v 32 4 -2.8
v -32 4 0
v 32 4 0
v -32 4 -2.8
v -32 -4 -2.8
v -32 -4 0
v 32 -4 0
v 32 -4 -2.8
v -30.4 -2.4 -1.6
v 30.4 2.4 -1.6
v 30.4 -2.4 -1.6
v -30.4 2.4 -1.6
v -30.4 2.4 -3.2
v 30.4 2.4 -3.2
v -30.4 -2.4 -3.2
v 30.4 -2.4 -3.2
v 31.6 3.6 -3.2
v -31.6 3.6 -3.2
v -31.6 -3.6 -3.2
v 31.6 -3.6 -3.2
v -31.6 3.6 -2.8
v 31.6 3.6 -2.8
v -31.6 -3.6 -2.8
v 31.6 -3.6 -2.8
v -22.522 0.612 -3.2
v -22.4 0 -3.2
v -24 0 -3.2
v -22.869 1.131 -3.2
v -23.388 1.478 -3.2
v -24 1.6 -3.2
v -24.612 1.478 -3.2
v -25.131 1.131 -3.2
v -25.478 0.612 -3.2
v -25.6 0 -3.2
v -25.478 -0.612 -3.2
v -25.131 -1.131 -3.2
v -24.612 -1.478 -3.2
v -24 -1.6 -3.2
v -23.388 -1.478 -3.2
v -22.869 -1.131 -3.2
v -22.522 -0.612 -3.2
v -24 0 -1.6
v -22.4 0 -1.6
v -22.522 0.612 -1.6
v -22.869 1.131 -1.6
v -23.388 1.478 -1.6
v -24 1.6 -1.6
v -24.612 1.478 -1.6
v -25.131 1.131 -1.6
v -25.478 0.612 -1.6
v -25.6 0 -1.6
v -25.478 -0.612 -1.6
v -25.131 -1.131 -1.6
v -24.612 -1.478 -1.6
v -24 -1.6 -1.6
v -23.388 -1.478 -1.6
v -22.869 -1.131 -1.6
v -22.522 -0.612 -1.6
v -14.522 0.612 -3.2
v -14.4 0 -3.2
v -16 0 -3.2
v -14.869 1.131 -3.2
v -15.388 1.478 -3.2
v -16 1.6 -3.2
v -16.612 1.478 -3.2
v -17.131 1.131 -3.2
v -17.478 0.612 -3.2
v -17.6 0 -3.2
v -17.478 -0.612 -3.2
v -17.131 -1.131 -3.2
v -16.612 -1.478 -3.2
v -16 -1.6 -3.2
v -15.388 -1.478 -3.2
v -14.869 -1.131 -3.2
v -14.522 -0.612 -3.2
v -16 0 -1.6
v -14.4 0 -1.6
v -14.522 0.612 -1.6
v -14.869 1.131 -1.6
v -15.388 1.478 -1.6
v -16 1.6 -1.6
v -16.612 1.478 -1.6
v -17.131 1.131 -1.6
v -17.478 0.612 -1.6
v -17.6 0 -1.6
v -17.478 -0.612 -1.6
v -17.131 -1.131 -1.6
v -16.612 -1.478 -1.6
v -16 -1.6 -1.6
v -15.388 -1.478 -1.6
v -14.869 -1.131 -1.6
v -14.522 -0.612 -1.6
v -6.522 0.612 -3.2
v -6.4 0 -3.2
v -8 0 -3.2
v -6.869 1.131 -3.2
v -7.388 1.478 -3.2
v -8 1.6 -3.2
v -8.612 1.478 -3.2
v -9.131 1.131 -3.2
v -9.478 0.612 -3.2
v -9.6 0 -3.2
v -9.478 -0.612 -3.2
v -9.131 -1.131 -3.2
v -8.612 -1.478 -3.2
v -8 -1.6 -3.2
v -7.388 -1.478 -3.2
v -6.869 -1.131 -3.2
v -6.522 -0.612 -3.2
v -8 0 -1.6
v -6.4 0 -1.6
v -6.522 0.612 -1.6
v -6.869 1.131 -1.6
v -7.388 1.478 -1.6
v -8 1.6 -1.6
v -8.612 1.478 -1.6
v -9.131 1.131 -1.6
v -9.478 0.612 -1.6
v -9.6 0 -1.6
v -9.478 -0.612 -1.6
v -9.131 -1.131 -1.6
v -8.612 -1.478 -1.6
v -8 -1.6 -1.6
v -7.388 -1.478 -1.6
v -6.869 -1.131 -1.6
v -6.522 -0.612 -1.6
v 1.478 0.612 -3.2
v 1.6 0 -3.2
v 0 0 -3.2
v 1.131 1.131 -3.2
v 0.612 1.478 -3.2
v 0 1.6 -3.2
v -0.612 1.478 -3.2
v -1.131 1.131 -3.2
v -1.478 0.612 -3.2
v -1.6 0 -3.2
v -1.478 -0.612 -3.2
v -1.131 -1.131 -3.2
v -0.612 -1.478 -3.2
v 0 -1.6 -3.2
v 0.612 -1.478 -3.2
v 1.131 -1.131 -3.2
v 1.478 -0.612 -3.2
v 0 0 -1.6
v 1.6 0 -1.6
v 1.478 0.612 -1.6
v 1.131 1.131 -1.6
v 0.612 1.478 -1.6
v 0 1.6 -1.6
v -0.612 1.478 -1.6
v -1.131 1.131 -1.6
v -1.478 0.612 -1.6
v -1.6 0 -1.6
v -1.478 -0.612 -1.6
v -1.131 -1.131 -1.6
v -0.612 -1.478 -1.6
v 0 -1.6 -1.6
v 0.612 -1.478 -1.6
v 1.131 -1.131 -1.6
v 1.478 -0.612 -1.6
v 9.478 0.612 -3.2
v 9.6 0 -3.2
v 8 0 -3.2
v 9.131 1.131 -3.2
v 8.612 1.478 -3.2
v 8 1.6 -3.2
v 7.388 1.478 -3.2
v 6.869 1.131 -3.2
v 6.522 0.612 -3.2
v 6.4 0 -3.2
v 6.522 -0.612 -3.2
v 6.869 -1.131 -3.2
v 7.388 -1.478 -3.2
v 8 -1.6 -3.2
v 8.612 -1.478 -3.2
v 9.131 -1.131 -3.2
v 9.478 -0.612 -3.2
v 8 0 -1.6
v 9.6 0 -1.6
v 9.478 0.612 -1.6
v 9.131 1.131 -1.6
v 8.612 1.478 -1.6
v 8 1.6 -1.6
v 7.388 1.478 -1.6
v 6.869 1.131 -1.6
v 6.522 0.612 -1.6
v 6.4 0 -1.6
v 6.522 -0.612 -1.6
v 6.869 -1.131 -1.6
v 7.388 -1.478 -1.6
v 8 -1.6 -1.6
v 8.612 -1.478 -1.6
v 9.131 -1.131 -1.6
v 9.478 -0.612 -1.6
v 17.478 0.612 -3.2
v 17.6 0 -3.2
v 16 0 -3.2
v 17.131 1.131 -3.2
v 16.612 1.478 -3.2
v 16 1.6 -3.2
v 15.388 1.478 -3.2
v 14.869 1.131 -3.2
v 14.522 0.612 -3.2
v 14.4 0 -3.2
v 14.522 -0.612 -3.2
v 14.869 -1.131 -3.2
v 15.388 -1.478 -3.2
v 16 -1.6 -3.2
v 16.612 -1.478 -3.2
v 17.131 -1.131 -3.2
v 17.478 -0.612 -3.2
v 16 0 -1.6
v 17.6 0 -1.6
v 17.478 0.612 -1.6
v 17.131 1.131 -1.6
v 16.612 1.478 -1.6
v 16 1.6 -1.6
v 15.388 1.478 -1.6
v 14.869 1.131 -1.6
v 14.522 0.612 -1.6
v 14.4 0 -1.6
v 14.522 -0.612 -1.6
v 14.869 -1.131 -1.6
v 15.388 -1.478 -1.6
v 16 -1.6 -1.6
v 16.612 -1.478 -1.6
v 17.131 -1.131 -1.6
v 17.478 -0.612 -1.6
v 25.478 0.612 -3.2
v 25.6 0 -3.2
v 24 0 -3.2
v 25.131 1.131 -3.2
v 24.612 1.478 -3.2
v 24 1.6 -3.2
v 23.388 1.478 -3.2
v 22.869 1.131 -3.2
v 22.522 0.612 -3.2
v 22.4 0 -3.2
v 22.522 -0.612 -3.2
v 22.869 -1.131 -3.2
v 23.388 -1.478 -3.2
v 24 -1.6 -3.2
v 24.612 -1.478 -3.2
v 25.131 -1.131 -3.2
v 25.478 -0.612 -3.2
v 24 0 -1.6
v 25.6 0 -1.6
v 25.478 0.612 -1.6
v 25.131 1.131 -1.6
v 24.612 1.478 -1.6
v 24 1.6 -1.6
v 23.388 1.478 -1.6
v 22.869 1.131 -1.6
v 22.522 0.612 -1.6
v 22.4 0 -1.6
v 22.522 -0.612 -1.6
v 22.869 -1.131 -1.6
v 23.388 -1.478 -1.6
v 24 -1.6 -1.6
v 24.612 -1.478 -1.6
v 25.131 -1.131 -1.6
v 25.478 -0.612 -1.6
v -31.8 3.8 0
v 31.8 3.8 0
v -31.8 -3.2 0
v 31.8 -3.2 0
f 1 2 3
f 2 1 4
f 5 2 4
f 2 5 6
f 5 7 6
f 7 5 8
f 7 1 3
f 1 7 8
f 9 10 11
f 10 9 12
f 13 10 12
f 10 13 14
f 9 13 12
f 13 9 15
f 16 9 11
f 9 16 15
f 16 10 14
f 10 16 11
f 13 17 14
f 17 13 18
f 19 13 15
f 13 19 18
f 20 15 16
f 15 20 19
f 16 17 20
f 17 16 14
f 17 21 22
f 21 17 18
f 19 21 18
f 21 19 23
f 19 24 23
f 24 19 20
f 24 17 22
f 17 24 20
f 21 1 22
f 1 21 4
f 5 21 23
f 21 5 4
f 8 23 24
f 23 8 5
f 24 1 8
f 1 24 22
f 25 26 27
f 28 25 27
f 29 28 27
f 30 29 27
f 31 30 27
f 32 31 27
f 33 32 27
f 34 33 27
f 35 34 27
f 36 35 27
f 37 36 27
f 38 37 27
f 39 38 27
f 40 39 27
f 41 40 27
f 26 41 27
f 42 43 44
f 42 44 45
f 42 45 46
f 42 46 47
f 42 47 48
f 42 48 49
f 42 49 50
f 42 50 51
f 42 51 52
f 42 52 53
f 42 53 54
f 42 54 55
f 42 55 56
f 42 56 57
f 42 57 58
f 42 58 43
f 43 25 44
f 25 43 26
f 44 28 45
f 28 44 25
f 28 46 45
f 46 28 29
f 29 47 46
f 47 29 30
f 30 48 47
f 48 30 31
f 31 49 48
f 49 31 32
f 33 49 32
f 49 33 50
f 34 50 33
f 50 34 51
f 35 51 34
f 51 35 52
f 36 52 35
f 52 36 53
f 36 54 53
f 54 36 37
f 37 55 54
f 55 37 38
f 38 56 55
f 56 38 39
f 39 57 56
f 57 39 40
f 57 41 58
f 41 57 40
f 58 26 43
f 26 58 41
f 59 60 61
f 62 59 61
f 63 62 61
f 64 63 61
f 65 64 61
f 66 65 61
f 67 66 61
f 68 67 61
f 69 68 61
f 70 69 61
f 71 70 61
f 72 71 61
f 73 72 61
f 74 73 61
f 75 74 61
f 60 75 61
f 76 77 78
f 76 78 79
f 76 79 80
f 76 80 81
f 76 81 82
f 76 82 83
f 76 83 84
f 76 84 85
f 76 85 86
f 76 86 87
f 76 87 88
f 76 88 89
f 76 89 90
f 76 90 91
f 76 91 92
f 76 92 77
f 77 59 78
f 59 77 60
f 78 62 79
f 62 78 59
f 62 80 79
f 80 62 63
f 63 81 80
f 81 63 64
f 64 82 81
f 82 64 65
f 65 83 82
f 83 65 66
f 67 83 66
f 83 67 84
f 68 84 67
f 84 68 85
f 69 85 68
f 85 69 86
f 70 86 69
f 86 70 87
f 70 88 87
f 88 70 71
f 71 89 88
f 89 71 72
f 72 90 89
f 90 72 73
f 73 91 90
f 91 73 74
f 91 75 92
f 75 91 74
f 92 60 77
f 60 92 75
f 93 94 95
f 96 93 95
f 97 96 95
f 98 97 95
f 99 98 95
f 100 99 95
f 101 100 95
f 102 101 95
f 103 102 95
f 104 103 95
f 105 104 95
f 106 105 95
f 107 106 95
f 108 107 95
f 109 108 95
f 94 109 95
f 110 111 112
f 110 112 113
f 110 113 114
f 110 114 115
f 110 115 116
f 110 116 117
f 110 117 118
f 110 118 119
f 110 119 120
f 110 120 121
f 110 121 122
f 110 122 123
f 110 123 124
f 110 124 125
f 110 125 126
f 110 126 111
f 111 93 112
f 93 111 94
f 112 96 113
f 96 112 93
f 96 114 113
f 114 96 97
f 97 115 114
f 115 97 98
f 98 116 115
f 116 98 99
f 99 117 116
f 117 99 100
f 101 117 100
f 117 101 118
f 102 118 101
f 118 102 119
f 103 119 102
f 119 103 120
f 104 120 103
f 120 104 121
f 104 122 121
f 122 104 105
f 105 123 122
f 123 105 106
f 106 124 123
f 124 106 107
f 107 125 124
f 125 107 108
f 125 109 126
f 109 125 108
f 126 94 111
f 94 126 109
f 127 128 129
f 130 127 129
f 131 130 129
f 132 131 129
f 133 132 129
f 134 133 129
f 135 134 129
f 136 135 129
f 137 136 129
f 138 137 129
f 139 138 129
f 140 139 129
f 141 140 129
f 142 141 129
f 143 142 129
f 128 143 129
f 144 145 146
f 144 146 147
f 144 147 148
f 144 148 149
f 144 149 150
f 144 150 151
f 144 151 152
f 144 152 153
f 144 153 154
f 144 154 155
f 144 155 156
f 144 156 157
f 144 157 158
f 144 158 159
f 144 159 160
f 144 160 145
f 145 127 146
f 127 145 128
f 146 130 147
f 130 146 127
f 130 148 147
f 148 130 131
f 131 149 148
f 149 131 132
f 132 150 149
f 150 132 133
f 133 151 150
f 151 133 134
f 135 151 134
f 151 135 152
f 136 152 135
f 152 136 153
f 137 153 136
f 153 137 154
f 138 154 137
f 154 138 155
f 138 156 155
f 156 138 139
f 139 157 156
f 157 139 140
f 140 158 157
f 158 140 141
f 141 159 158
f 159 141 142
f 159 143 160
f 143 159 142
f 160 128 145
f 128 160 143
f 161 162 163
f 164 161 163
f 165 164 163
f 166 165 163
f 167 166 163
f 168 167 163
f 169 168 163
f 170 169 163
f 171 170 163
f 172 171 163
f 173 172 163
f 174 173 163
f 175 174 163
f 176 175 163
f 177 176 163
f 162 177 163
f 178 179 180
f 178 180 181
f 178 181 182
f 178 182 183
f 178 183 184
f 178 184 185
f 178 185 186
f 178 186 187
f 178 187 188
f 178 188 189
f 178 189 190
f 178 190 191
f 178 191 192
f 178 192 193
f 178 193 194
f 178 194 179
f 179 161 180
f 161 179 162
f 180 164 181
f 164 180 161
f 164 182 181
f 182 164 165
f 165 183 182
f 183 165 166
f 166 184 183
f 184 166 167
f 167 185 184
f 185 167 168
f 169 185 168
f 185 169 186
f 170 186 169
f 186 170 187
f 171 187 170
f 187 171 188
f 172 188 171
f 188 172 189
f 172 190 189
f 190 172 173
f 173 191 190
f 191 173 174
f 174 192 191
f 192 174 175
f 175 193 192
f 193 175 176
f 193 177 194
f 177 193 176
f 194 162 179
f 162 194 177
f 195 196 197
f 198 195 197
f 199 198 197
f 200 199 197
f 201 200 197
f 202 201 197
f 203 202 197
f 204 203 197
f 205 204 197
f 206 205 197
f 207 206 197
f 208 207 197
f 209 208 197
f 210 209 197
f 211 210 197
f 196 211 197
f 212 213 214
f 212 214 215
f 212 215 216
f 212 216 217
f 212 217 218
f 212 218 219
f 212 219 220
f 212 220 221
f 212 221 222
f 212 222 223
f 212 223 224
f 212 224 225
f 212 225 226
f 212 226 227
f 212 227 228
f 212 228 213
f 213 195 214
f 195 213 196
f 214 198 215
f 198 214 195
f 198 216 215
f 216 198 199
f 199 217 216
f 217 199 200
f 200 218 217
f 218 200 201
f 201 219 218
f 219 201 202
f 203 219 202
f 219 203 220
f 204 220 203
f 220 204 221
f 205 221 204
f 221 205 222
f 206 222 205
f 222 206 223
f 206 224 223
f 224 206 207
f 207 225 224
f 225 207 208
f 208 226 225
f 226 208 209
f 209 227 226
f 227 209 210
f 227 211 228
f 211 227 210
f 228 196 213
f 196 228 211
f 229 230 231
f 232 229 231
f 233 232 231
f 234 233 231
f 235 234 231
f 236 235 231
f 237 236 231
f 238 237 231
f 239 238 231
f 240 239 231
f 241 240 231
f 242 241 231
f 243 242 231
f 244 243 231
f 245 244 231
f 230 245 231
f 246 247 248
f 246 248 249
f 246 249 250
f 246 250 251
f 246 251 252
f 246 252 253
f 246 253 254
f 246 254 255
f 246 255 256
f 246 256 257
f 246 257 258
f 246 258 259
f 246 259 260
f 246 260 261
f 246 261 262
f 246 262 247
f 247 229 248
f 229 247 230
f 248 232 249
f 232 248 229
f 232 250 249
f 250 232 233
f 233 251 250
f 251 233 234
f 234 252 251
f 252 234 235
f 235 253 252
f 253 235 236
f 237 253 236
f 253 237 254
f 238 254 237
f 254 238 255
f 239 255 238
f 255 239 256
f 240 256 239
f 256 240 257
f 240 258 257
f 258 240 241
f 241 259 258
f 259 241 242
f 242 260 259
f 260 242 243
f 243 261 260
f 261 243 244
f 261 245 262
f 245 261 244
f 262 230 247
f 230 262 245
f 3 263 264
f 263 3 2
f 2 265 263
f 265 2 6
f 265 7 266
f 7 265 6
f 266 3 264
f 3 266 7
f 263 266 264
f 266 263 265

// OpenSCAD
// file: ../p/4-4edge.scad
use <../lib.scad>
function ldraw_lib__4_4edge() = [
// 0 Circle 1.0
// 0 Name: 4-4edge.dat
// 0 Author: James Jessiman
// 0 !LDRAW_ORG Primitive UPDATE 2017-01
// 0 !LICENSE Licensed under CC BY 2.0 and CC BY 4.0 : see CAreadme.txt
// 
// 0 BFC CERTIFY CCW
  [0,"BFC","CERTIFY"],
  [0,"BFC","CCW"],
// 
// 0 !HISTORY 1998-12-15 [PTadmin] Official Update 1998-10
// 0 !HISTORY 2005-12-28 [PTadmin] Official Update 2005-01
// 0 !HISTORY 2007-06-24 [PTadmin] Header formatted for Contributor Agreement
// 0 !HISTORY 2008-07-01 [PTadmin] Official Update 2008-01
// 0 !HISTORY 2017-01-15 [Steffen] BFCed
// 0 !HISTORY 2017-12-30 [PTadmin] Official Update 2017-01
// 
// 
// 2 24 1 0 0 0.9239 0 0.3827
  [2,24,1,0,0,0.9239,0,0.3827],
// 2 24 0.9239 0 0.3827 0.7071 0 0.7071
  [2,24,0.9239,0,0.3827,0.7071,0,0.7071],
// 2 24 0.7071 0 0.7071 0.3827 0 0.9239
  [2,24,0.7071,0,0.7071,0.3827,0,0.9239],
// 2 24 0.3827 0 0.9239 0 0 1
  [2,24,0.3827,0,0.9239,0,0,1],
// 2 24 0 0 1 -0.3827 0 0.9239
  [2,24,0,0,1,-0.3827,0,0.9239],
// 2 24 -0.3827 0 0.9239 -0.7071 0 0.7071
  [2,24,-0.3827,0,0.9239,-0.7071,0,0.7071],
// 2 24 -0.7071 0 0.7071 -0.9239 0 0.3827
  [2,24,-0.7071,0,0.7071,-0.9239,0,0.3827],
// 2 24 -0.9239 0 0.3827 -1 0 -0
  [2,24,-0.9239,0,0.3827,-1,0,-0],
// 2 24 -1 0 -0 -0.9239 0 -0.3827
  [2,24,-1,0,-0,-0.9239,0,-0.3827],
// 2 24 -0.9239 0 -0.3827 -0.7071 0 -0.7071
  [2,24,-0.9239,0,-0.3827,-0.7071,0,-0.7071],
// 2 24 -0.7071 0 -0.7071 -0.3827 0 -0.9239
  [2,24,-0.7071,0,-0.7071,-0.3827,0,-0.9239],
// 2 24 -0.3827 0 -0.9239 0 0 -1
  [2,24,-0.3827,0,-0.9239,0,0,-1],
// 2 24 0 0 -1 0.3827 0 -0.9239
  [2,24,0,0,-1,0.3827,0,-0.9239],
// 2 24 0.3827 0 -0.9239 0.7071 0 -0.7071
  [2,24,0.3827,0,-0.9239,0.7071,0,-0.7071],
// 2 24 0.7071 0 -0.7071 0.9239 0 -0.3827
  [2,24,0.7071,0,-0.7071,0.9239,0,-0.3827],
// 2 24 0.9239 0 -0.3827 1 0 0
  [2,24,0.9239,0,-0.3827,1,0,0],
];
module ldraw_lib__4_4edge(step=0, col=false, unit=2/5, alt=false, line=0.2, solid=!$preview)
    makepoly(ldraw_lib__4_4edge(), step=step, col=col, unit=unit, alt=alt, line=line, solid=solid);
ldraw_lib__4_4edge(line=0.2);
// file: ../p/4-4disc.scad
use <../lib.scad>
function ldraw_lib__4_4disc() = [
// 0 Disc 1.0
// 0 Name: 4-4disc.dat
// 0 Author: James Jessiman
// 0 !LDRAW_ORG Primitive UPDATE 2002-02
// 0 !LICENSE Licensed under CC BY 2.0 and CC BY 4.0 : see CAreadme.txt
// 
// 0 BFC CERTIFY CCW
  [0,"BFC","CERTIFY"],
  [0,"BFC","CCW"],
// 
// 0 !HISTORY 1998-12-15 [PTadmin] Official Update 1998-10
// 0 !HISTORY 2002-03-23 [sbliss] Added BFC statement
// 0 !HISTORY 2002-04-25 [PTadmin] Official Update 2002-02
// 0 !HISTORY 2007-06-24 [PTadmin] Header formatted for Contributor Agreement
// 0 !HISTORY 2008-07-01 [PTadmin] Official Update 2008-01
// 
// 
// 3 16 0 0 0 1 0 0 0.9239 0 0.3827
  [3,16,0,0,0,1,0,0,0.9239,0,0.3827],
// 3 16 0 0 0 0.9239 0 0.3827 0.7071 0 0.7071
  [3,16,0,0,0,0.9239,0,0.3827,0.7071,0,0.7071],
// 3 16 0 0 0 0.7071 0 0.7071 0.3827 0 0.9239
  [3,16,0,0,0,0.7071,0,0.7071,0.3827,0,0.9239],
// 3 16 0 0 0 0.3827 0 0.9239 0 0 1
  [3,16,0,0,0,0.3827,0,0.9239,0,0,1],
// 3 16 0 0 0 0 0 1 -0.3827 0 0.9239
  [3,16,0,0,0,0,0,1,-0.3827,0,0.9239],
// 3 16 0 0 0 -0.3827 0 0.9239 -0.7071 0 0.7071
  [3,16,0,0,0,-0.3827,0,0.9239,-0.7071,0,0.7071],
// 3 16 0 0 0 -0.7071 0 0.7071 -0.9239 0 0.3827
  [3,16,0,0,0,-0.7071,0,0.7071,-0.9239,0,0.3827],
// 3 16 0 0 0 -0.9239 0 0.3827 -1 0 -0
  [3,16,0,0,0,-0.9239,0,0.3827,-1,0,-0],
// 3 16 0 0 0 -1 0 -0 -0.9239 0 -0.3827
  [3,16,0,0,0,-1,0,-0,-0.9239,0,-0.3827],
// 3 16 0 0 0 -0.9239 0 -0.3827 -0.7071 0 -0.7071
  [3,16,0,0,0,-0.9239,0,-0.3827,-0.7071,0,-0.7071],
// 3 16 0 0 0 -0.7071 0 -0.7071 -0.3827 0 -0.9239
  [3,16,0,0,0,-0.7071,0,-0.7071,-0.3827,0,-0.9239],
// 3 16 0 0 0 -0.3827 0 -0.9239 0 0 -1
  [3,16,0,0,0,-0.3827,0,-0.9239,0,0,-1],
// 3 16 0 0 0 0 0 -1 0.3827 0 -0.9239
  [3,16,0,0,0,0,0,-1,0.3827,0,-0.9239],
// 3 16 0 0 0 0.3827 0 -0.9239 0.7071 0 -0.7071
  [3,16,0,0,0,0.3827,0,-0.9239,0.7071,0,-0.7071],
// 3 16 0 0 0 0.7071 0 -0.7071 0.9239 0 -0.3827
  [3,16,0,0,0,0.7071,0,-0.7071,0.9239,0,-0.3827],
// 3 16 0 0 0 0.9239 0 -0.3827 1 0 0
  [3,16,0,0,0,0.9239,0,-0.3827,1,0,0],
// 0
];
module ldraw_lib__4_4disc(step=0, col=false, unit=2/5, alt=false, line=0.2, solid=!$preview)
    makepoly(ldraw_lib__4_4disc(), step=step, col=col, unit=unit, alt=alt, line=line, solid=solid);
ldraw_lib__4_4disc(line=0.2);
// file: ../p/4-4cyli.scad
use <../lib.scad>
$fa=1; $fs=0.2;
function ldraw_lib__4_4cyli(realsolid=false) = [
// 0 Cylinder 1.0
// 0 Name: 4-4cyli.dat
// 0 Author: James Jessiman
// 0 !LDRAW_ORG Primitive UPDATE 2005-01
// 0 !LICENSE Licensed under CC BY 2.0 and CC BY 4.0 : see CAreadme.txt
// 
// 0 BFC CERTIFY CCW
  [0,"BFC","CERTIFY"],
  [0,"BFC","CCW"],
// 
// 0 !HISTORY 1998-12-15 [PTadmin] Official Update 1998-10
// 0 !HISTORY 2002-03-23 [sbliss] Added BFC statement; merged headers from files in distributions LDraw 0.27 and Complete.
// 0 !HISTORY 2002-04-25 [PTadmin] Official Update 2002-02
// 0 !HISTORY 2004-12-14 [guyvivan] BFC CCW
// 0 !HISTORY 2005-12-28 [PTadmin] Official Update 2005-01
// 0 !HISTORY 2007-06-24 [PTadmin] Header formatted for Contributor Agreement
// 0 !HISTORY 2008-07-01 [PTadmin] Official Update 2008-01
// 
// 
// 4 16 1 1 0 0.9239 1 0.3827 0.9239 0 0.3827 1 0 0
  [4,16,1,1,0,0.9239,1,0.3827,0.9239,0,0.3827,1,0,0],
// 5 24 1 0 0 1 1 0 0.9239 0 0.3827 0.9239 0 -0.3827
  [5,24,1,0,0,1,1,0,0.9239,0,0.3827,0.9239,0,-0.3827],
// 4 16 0.9239 1 0.3827 0.7071 1 0.7071 0.7071 0 0.7071 0.9239 0 0.3827
  [4,16,0.9239,1,0.3827,0.7071,1,0.7071,0.7071,0,0.7071,0.9239,0,0.3827],
// 5 24 0.9239 0 0.3827 0.9239 1 0.3827 0.7071 0 0.7071 1 0 0
  [5,24,0.9239,0,0.3827,0.9239,1,0.3827,0.7071,0,0.7071,1,0,0],
// 4 16 0.7071 1 0.7071 0.3827 1 0.9239 0.3827 0 0.9239 0.7071 0 0.7071
  [4,16,0.7071,1,0.7071,0.3827,1,0.9239,0.3827,0,0.9239,0.7071,0,0.7071],
// 5 24 0.7071 0 0.7071 0.7071 1 0.7071 0.3827 0 0.9239 0.9239 0 0.3827
  [5,24,0.7071,0,0.7071,0.7071,1,0.7071,0.3827,0,0.9239,0.9239,0,0.3827],
// 4 16 0.3827 1 0.9239 0 1 1 0 0 1 0.3827 0 0.9239
  [4,16,0.3827,1,0.9239,0,1,1,0,0,1,0.3827,0,0.9239],
// 5 24 0.3827 0 0.9239 0.3827 1 0.9239 0 0 1 0.7071 0 0.7071
  [5,24,0.3827,0,0.9239,0.3827,1,0.9239,0,0,1,0.7071,0,0.7071],
// 4 16 0 1 1 -0.3827 1 0.9239 -0.3827 0 0.9239 0 0 1
  [4,16,0,1,1,-0.3827,1,0.9239,-0.3827,0,0.9239,0,0,1],
// 5 24 0 0 1 0 1 1 -0.3827 0 0.9239 0.3827 0 0.9239
  [5,24,0,0,1,0,1,1,-0.3827,0,0.9239,0.3827,0,0.9239],
// 4 16 -0.3827 1 0.9239 -0.7071 1 0.7071 -0.7071 0 0.7071 -0.3827 0 0.9239
  [4,16,-0.3827,1,0.9239,-0.7071,1,0.7071,-0.7071,0,0.7071,-0.3827,0,0.9239],
// 5 24 -0.3827 0 0.9239 -0.3827 1 0.9239 -0.7071 0 0.7071 0 0 1
  [5,24,-0.3827,0,0.9239,-0.3827,1,0.9239,-0.7071,0,0.7071,0,0,1],
// 4 16 -0.7071 1 0.7071 -0.9239 1 0.3827 -0.9239 0 0.3827 -0.7071 0 0.7071
  [4,16,-0.7071,1,0.7071,-0.9239,1,0.3827,-0.9239,0,0.3827,-0.7071,0,0.7071],
// 5 24 -0.7071 0 0.7071 -0.7071 1 0.7071 -0.9239 0 0.3827 -0.3827 0 0.9239
  [5,24,-0.7071,0,0.7071,-0.7071,1,0.7071,-0.9239,0,0.3827,-0.3827,0,0.9239],
// 4 16 -0.9239 1 0.3827 -1 1 0 -1 0 0 -0.9239 0 0.3827
  [4,16,-0.9239,1,0.3827,-1,1,0,-1,0,0,-0.9239,0,0.3827],
// 5 24 -0.9239 0 0.3827 -0.9239 1 0.3827 -1 0 0 -0.7071 0 0.7071
  [5,24,-0.9239,0,0.3827,-0.9239,1,0.3827,-1,0,0,-0.7071,0,0.7071],
// 4 16 -1 1 0 -0.9239 1 -0.3827 -0.9239 0 -0.3827 -1 0 0
  [4,16,-1,1,0,-0.9239,1,-0.3827,-0.9239,0,-0.3827,-1,0,0],
// 5 24 -1 0 0 -1 1 0 -0.9239 0 -0.3827 -0.9239 0 0.3827
  [5,24,-1,0,0,-1,1,0,-0.9239,0,-0.3827,-0.9239,0,0.3827],
// 4 16 -0.9239 1 -0.3827 -0.7071 1 -0.7071 -0.7071 0 -0.7071 -0.9239 0 -0.3827
  [4,16,-0.9239,1,-0.3827,-0.7071,1,-0.7071,-0.7071,0,-0.7071,-0.9239,0,-0.3827],
// 5 24 -0.9239 0 -0.3827 -0.9239 1 -0.3827 -0.7071 0 -0.7071 -1 0 0
  [5,24,-0.9239,0,-0.3827,-0.9239,1,-0.3827,-0.7071,0,-0.7071,-1,0,0],
// 4 16 -0.7071 1 -0.7071 -0.3827 1 -0.9239 -0.3827 0 -0.9239 -0.7071 0 -0.7071
  [4,16,-0.7071,1,-0.7071,-0.3827,1,-0.9239,-0.3827,0,-0.9239,-0.7071,0,-0.7071],
// 5 24 -0.7071 0 -0.7071 -0.7071 1 -0.7071 -0.3827 0 -0.9239 -0.9239 0 -0.3827
  [5,24,-0.7071,0,-0.7071,-0.7071,1,-0.7071,-0.3827,0,-0.9239,-0.9239,0,-0.3827],
// 4 16 -0.3827 1 -0.9239 0 1 -1 0 0 -1 -0.3827 0 -0.9239
  [4,16,-0.3827,1,-0.9239,0,1,-1,0,0,-1,-0.3827,0,-0.9239],
// 5 24 -0.3827 0 -0.9239 -0.3827 1 -0.9239 0 0 -1 -0.7071 0 -0.7071
  [5,24,-0.3827,0,-0.9239,-0.3827,1,-0.9239,0,0,-1,-0.7071,0,-0.7071],
// 4 16 0 1 -1 0.3827 1 -0.9239 0.3827 0 -0.9239 0 0 -1
  [4,16,0,1,-1,0.3827,1,-0.9239,0.3827,0,-0.9239,0,0,-1],
// 5 24 0 0 -1 0 1 -1 0.3827 0 -0.9239 -0.3827 0 -0.9239
  [5,24,0,0,-1,0,1,-1,0.3827,0,-0.9239,-0.3827,0,-0.9239],
// 4 16 0.3827 1 -0.9239 0.7071 1 -0.7071 0.7071 0 -0.7071 0.3827 0 -0.9239
  [4,16,0.3827,1,-0.9239,0.7071,1,-0.7071,0.7071,0,-0.7071,0.3827,0,-0.9239],
// 5 24 0.3827 0 -0.9239 0.3827 1 -0.9239 0.7071 0 -0.7071 0 0 -1
  [5,24,0.3827,0,-0.9239,0.3827,1,-0.9239,0.7071,0,-0.7071,0,0,-1],
// 4 16 0.7071 1 -0.7071 0.9239 1 -0.3827 0.9239 0 -0.3827 0.7071 0 -0.7071
  [4,16,0.7071,1,-0.7071,0.9239,1,-0.3827,0.9239,0,-0.3827,0.7071,0,-0.7071],
// 5 24 0.7071 0 -0.7071 0.7071 1 -0.7071 0.9239 0 -0.3827 0.3827 0 -0.9239
  [5,24,0.7071,0,-0.7071,0.7071,1,-0.7071,0.9239,0,-0.3827,0.3827,0,-0.9239],
// 4 16 0.9239 1 -0.3827 1 1 0 1 0 0 0.9239 0 -0.3827
  [4,16,0.9239,1,-0.3827,1,1,0,1,0,0,0.9239,0,-0.3827],
// 5 24 0.9239 0 -0.3827 0.9239 1 -0.3827 1 0 0 0.7071 0 -0.7071
  [5,24,0.9239,0,-0.3827,0.9239,1,-0.3827,1,0,0,0.7071,0,-0.7071],
// 0
];
module ldraw_lib__4_4cyli(step=0, col=false, unit=2/5, alt=false, line=0.2, solid=!$preview)
    makepoly(ldraw_lib__4_4cyli(solid), step=step, col=col, unit=unit, alt=alt, line=line, solid=solid);
ldraw_lib__4_4cyli(line=0.2);
// file: ../p/stud3.scad
use <../lib.scad>
use <4-4cyli.scad>
use <4-4disc.scad>
use <4-4edge.scad>
function ldraw_lib__stud3() = [
// 0 Stud Tube Solid
// 0 Name: stud3.dat
// 0 Author: James Jessiman
// 0 !LDRAW_ORG Primitive UPDATE 2012-01
// 0 !LICENSE Licensed under CC BY 4.0 : see CAreadme.txt
// 
// 0 BFC CERTIFY CCW
  [0,"BFC","CERTIFY"],
  [0,"BFC","CCW"],
// 
// 0 !HISTORY 2002-04-04 [sbliss] Modified for BFC compliance
// 0 !HISTORY 2002-04-25 [PTadmin] Official Update 2002-02
// 0 !HISTORY 2007-06-24 [PTadmin] Header formatted for Contributor Agreement
// 0 !HISTORY 2008-07-01 [PTadmin] Official Update 2008-01
// 0 !HISTORY 2012-02-16 [Philo] Changed to CCW
// 0 !HISTORY 2012-03-30 [PTadmin] Official Update 2012-01
// 
// 
// 1 16 0 -4 0 4 0 0 0 1 0 0 0 4 4-4edge.dat
  [1,16,0,-4,0,4,0,0,0,1,0,0,0,4, ldraw_lib__4_4edge()],
// 1 16 0 0 0 4 0 0 0 1 0 0 0 4 4-4edge.dat
  [1,16,0,0,0,4,0,0,0,1,0,0,0,4, ldraw_lib__4_4edge()],
// 1 16 0 -4 0 4 0 0 0 1 0 0 0 4 4-4disc.dat
  [1,16,0,-4,0,4,0,0,0,1,0,0,0,4, ldraw_lib__4_4disc()],
  [-1,16,0,0,0,4,0,0,0,-1,0,0,0,4, ldraw_lib__4_4disc()],
// 1 16 0 -4 0 4 0 0 0 4 0 0 0 4 4-4cyli.dat
  [1,16,0,-4,0,4,0,0,0,4,0,0,0,4, ldraw_lib__4_4cyli()],
];
module ldraw_lib__stud3(step=0, col=false, unit=2/5, alt=false, line=0.2, solid=!$preview)
    makepoly(ldraw_lib__stud3(), step=step, col=col, unit=unit, alt=alt, line=line, solid=solid);
ldraw_lib__stud3(line=0.2);
// file: ../p/stug3-1x7.scad
use <../lib.scad>
use <stud3.scad>
function ldraw_lib__stug3_1x7() = [
// 0 Stud Tube Solid Group  1 x  7
// 0 Name: stug3-1x7.dat
// 0 Author: Steffen [Steffen]
// 0 !LDRAW_ORG Primitive UPDATE 2012-01
// 0 !LICENSE Licensed under CC BY 4.0 : see CAreadme.txt
// 
// 0 BFC CERTIFY CCW
  [0,"BFC","CERTIFY"],
  [0,"BFC","CCW"],
// 
// 0 !HISTORY 2012-03-30 [PTadmin] Official Update 2012-01
// 
// 
// 1 16 -60 0 0 1 0 0 0 1 0 0 0 1 stud3.dat
  [1,16,-60,0,0,1,0,0,0,1,0,0,0,1, ldraw_lib__stud3()],
// 1 16 -40 0 0 1 0 0 0 1 0 0 0 1 stud3.dat
  [1,16,-40,0,0,1,0,0,0,1,0,0,0,1, ldraw_lib__stud3()],
// 1 16 -20 0 0 1 0 0 0 1 0 0 0 1 stud3.dat
  [1,16,-20,0,0,1,0,0,0,1,0,0,0,1, ldraw_lib__stud3()],
// 1 16 0 0 0 1 0 0 0 1 0 0 0 1 stud3.dat
  [1,16,0,0,0,1,0,0,0,1,0,0,0,1, ldraw_lib__stud3()],
// 1 16 20 0 0 1 0 0 0 1 0 0 0 1 stud3.dat
  [1,16,20,0,0,1,0,0,0,1,0,0,0,1, ldraw_lib__stud3()],
// 1 16 40 0 0 1 0 0 0 1 0 0 0 1 stud3.dat
  [1,16,40,0,0,1,0,0,0,1,0,0,0,1, ldraw_lib__stud3()],
// 1 16 60 0 0 1 0 0 0 1 0 0 0 1 stud3.dat
  [1,16,60,0,0,1,0,0,0,1,0,0,0,1, ldraw_lib__stud3()],
];
module ldraw_lib__stug3_1x7(step=0, col=false, unit=2/5, alt=false, line=0.2, solid=!$preview)
    makepoly(ldraw_lib__stug3_1x7(), step=step, col=col, unit=unit, alt=alt, line=line, solid=solid);
ldraw_lib__stug3_1x7(line=0.2);
// file: ../p/box5.scad
use <../lib.scad>
function ldraw_lib__box5() = [
// 0 Box with 5 Faces and All Edges
// 0 Name: box5.dat
// 0 Author: James Jessiman
// 0 !LDRAW_ORG Primitive UPDATE 2012-01
// 0 !LICENSE Licensed under CC BY 2.0 and CC BY 4.0 : see CAreadme.txt
// 
// 0 BFC CERTIFY CCW
  [0,"BFC","CERTIFY"],
  [0,"BFC","CCW"],
// 
// 0 !HISTORY 2002-04-03 [sbliss] Modified for BFC compliance
// 0 !HISTORY 2002-04-25 [PTadmin] Official Update 2002-02
// 0 !HISTORY 2007-06-24 [PTadmin] Header formatted for Contributor Agreement
// 0 !HISTORY 2008-07-01 [PTadmin] Official Update 2008-01
// 0 !HISTORY 2012-02-16 [Philo] Changed to CCW
// 0 !HISTORY 2012-03-30 [PTadmin] Official Update 2012-01
// 
// 
// 2 24 1 1 1 -1 1 1
  [2,24,1,1,1,-1,1,1],
// 2 24 -1 1 1 -1 1 -1
  [2,24,-1,1,1,-1,1,-1],
// 2 24 -1 1 -1 1 1 -1
  [2,24,-1,1,-1,1,1,-1],
// 2 24 1 1 -1 1 1 1
  [2,24,1,1,-1,1,1,1],
// 2 24 1 0 1 -1 0 1
  [2,24,1,0,1,-1,0,1],
// 2 24 -1 0 1 -1 0 -1
  [2,24,-1,0,1,-1,0,-1],
// 2 24 -1 0 -1 1 0 -1
  [2,24,-1,0,-1,1,0,-1],
// 2 24 1 0 -1 1 0 1
  [2,24,1,0,-1,1,0,1],
// 2 24 1 0 1 1 1 1
  [2,24,1,0,1,1,1,1],
// 2 24 -1 0 1 -1 1 1
  [2,24,-1,0,1,-1,1,1],
// 2 24 1 0 -1 1 1 -1
  [2,24,1,0,-1,1,1,-1],
// 2 24 -1 0 -1 -1 1 -1
  [2,24,-1,0,-1,-1,1,-1],
// 4 16 -1 1 1 1 1 1 1 1 -1 -1 1 -1
  [4,16,-1,1,1,1,1,1,1,1,-1,-1,1,-1],
// 4 16 -1 1 1 -1 0 1 1 0 1 1 1 1
  [4,16,-1,1,1,-1,0,1,1,0,1,1,1,1],
// 4 16 -1 1 -1 -1 0 -1 -1 0 1 -1 1 1
  [4,16,-1,1,-1,-1,0,-1,-1,0,1,-1,1,1],
// 4 16 1 1 -1 1 0 -1 -1 0 -1 -1 1 -1
  [4,16,1,1,-1,1,0,-1,-1,0,-1,-1,1,-1],
// 4 16 1 1 1 1 0 1 1 0 -1 1 1 -1
  [4,16,1,1,1,1,0,1,1,0,-1,1,1,-1],
];
makepoly(ldraw_lib__box5(), line=0.2);
// file: ../p/box4.scad
use <../lib.scad>
function ldraw_lib__box4() = [
// 0 Box with 4 Faces (2 Parallel Pairs) and All Edges
// 0 Name: box4.dat
// 0 Author: James Jessiman
// 0 !LDRAW_ORG Primitive UPDATE 2012-01
// 0 !LICENSE Licensed under CC BY 4.0 : see CAreadme.txt
// 
// 0 BFC CERTIFY CCW
  [0,"BFC","CERTIFY"],
  [0,"BFC","CCW"],
// 
// 0 !HISTORY 2002-04-03 [sbliss] Modified for BFC compliance
// 0 !HISTORY 2002-04-25 [PTadmin] Official Update 2002-02
// 0 !HISTORY 2007-06-24 [PTadmin] Header formatted for Contributor Agreement
// 0 !HISTORY 2008-07-01 [PTadmin] Official Update 2008-01
// 0 !HISTORY 2012-02-16 [Philo] Changed to CCW
// 0 !HISTORY 2012-03-30 [PTadmin] Official Update 2012-01
// 
// 
// 2 24 1 1 1 -1 1 1
  [2,24,1,1,1,-1,1,1],
// 2 24 -1 1 1 -1 1 -1
  [2,24,-1,1,1,-1,1,-1],
// 2 24 -1 1 -1 1 1 -1
  [2,24,-1,1,-1,1,1,-1],
// 2 24 1 1 -1 1 1 1
  [2,24,1,1,-1,1,1,1],
// 2 24 1 0 1 -1 0 1
  [2,24,1,0,1,-1,0,1],
// 2 24 -1 0 1 -1 0 -1
  [2,24,-1,0,1,-1,0,-1],
// 2 24 -1 0 -1 1 0 -1
  [2,24,-1,0,-1,1,0,-1],
// 2 24 1 0 -1 1 0 1
  [2,24,1,0,-1,1,0,1],
// 2 24 1 0 1 1 1 1
  [2,24,1,0,1,1,1,1],
// 2 24 -1 0 1 -1 1 1
  [2,24,-1,0,1,-1,1,1],
// 2 24 1 0 -1 1 1 -1
  [2,24,1,0,-1,1,1,-1],
// 2 24 -1 0 -1 -1 1 -1
  [2,24,-1,0,-1,-1,1,-1],
// 4 16 -1 1 1 -1 0 1 1 0 1 1 1 1
  [4,16,-1,1,1,-1,0,1,1,0,1,1,1,1],
// 4 16 -1 1 -1 -1 0 -1 -1 0 1 -1 1 1
  [4,16,-1,1,-1,-1,0,-1,-1,0,1,-1,1,1],
// 4 16 1 1 -1 1 0 -1 -1 0 -1 -1 1 -1
  [4,16,1,1,-1,1,0,-1,-1,0,-1,-1,1,-1],
// 4 16 1 1 1 1 0 1 1 0 -1 1 1 -1
  [4,16,1,1,1,1,0,1,1,0,-1,1,1,-1],
];
module ldraw_lib__box4(step=0, col=false, unit=2/5, alt=false, line=0.2, solid=!$preview)
    makepoly(ldraw_lib__box4(), step=step, col=col, unit=unit, alt=alt, line=line, solid=solid);
ldraw_lib__box4(line=0.2);
// file: s/4162s01.scad
use <../../lib.scad>
use <../../p/box4.scad>
use <../../p/box5.scad>
use <../../p/stug3-1x7.scad>
function ldraw_lib__s__4162s01() = [
// 0 ~Tile  1 x  8 without Top Face
// 0 Name: s\4162s01.dat
// 0 Author: Philippe Hurbain [Philo]
// 0 !LDRAW_ORG Subpart UPDATE 2012-01
// 0 !LICENSE Licensed under CC BY 4.0 : see CAreadme.txt
// 
// 0 BFC CERTIFY CCW
  [0,"BFC","CERTIFY"],
  [0,"BFC","CCW"],
// 
// 0 !HISTORY 2012-03-30 [PTadmin] Official Update 2012-01
// 
// 
// 1 16 0 7 0 80 0 0 0 -7 0 0 0 10 box4.dat
  [1,16,0,7,0,80,0,0,0,-7,0,0,0,10, ldraw_lib__box4()],
// 0 BFC INVERTNEXT
  [0,"BFC","INVERTNEXT"],
// 1 16 0 8 0 76 0 0 0 -4 0 0 0 6 box5.dat
  [1,16,0,8,0,76,0,0,0,-4,0,0,0,6, ldraw_lib__box5()],
// 4 16 79 8 9 76 8 6 -76 8 6 -79 8 9
  [4,16,79,8,9,76,8,6,-76,8,6,-79,8,9],
// 4 16 -79 8 9 -76 8 6 -76 8 -6 -79 8 -9
  [4,16,-79,8,9,-76,8,6,-76,8,-6,-79,8,-9],
// 4 16 -79 8 -9 -76 8 -6 76 8 -6 79 8 -9
  [4,16,-79,8,-9,-76,8,-6,76,8,-6,79,8,-9],
// 4 16 79 8 -9 76 8 -6 76 8 6 79 8 9
  [4,16,79,8,-9,76,8,-6,76,8,6,79,8,9],
// 1 16 0 8 0 79 0 0 0 -1 0 0 0 9 box4.dat
  [1,16,0,8,0,79,0,0,0,-1,0,0,0,9, ldraw_lib__box4()],
// 4 16 80 7 10 79 7 9 -79 7 9 -80 7 10
  [4,16,80,7,10,79,7,9,-79,7,9,-80,7,10],
// 4 16 -80 7 10 -79 7 9 -79 7 -9 -80 7 -10
  [4,16,-80,7,10,-79,7,9,-79,7,-9,-80,7,-10],
// 4 16 -80 7 -10 -79 7 -9 79 7 -9 80 7 -10
  [4,16,-80,7,-10,-79,7,-9,79,7,-9,80,7,-10],
// 4 16 80 7 -10 79 7 -9 79 7 9 80 7 10
  [4,16,80,7,-10,79,7,-9,79,7,9,80,7,10],
// 1 16 0 4 0 1 0 0 0 -1 0 0 0 1 stug3-1x7.dat
  [1,16,0,4,0,1,0,0,0,-1,0,0,0,1, ldraw_lib__stug3_1x7()],
];
module ldraw_lib__s__4162s01(step=0, col=false, unit=2/5, alt=false, line=0.2, solid=!$preview)
    makepoly(ldraw_lib__s__4162s01(), step=step, col=col, unit=unit, alt=alt, line=line, solid=solid);
ldraw_lib__s__4162s01(line=0.2);
// main file
use <../lib.scad>
use <s/4162s01.scad>
function ldraw_lib__4162p0f() = [
// 0 Tile  1 x  8 with Black Offset Rectangle Pattern
// 0 Name: 4162p0f.dat
// 0 Author: Ulrich Röder [UR]
// 0 !LDRAW_ORG Part UPDATE 2019-01
// 0 !LICENSE Licensed under CC BY 4.0 : see CAreadme.txt
// 
// 0 BFC CERTIFY CCW
  [0,"BFC","CERTIFY"],
  [0,"BFC","CCW"],
// 
// 0 !KEYWORDS Bricklink 4162pb156, Car, Caterham, Cuusoo, Ideas
// 0 !KEYWORDS Rebrickable 4162pr0054, Set 21307
// 
// 0 !HISTORY 2019-06-28 [PTadmin] Official Update 2019-01
// 
// 
// 0 // Main
// 
// 1 16 0 0 0 1 0 0 0 1 0 0 0 1 s\4162s01.dat
  [1,16,0,0,0,1,0,0,0,1,0,0,0,1, ldraw_lib__s__4162s01()],
// 4 16 -80 0 10 -79.5 0 9.5 79.5 0 9.5 80 0 10
  [4,16,-80,0,10,-79.5,0,9.5,79.5,0,9.5,80,0,10],
// 4 16 -79.5 0 -8 -79.5 0 9.5 -80 0 10 -80 0 -10
  [4,16,-79.5,0,-8,-79.5,0,9.5,-80,0,10,-80,0,-10],
// 4 16 -79.5 0 -8 -80 0 -10 80 0 -10 79.5 0 -8
  [4,16,-79.5,0,-8,-80,0,-10,80,0,-10,79.5,0,-8],
// 4 16 80 0 -10 80 0 10 79.5 0 9.5 79.5 0 -8
  [4,16,80,0,-10,80,0,10,79.5,0,9.5,79.5,0,-8],
// 
// 0 // Black
// 4 0 79.5 0 -8 79.5 0 9.5 -79.5 0 9.5 -79.5 0 -8
  [4,0,79.5,0,-8,79.5,0,9.5,-79.5,0,9.5,-79.5,0,-8],
];
module ldraw_lib__4162p0f(step=0, col=false, unit=2/5, alt=false, line=0.2, solid=!$preview)
    makepoly(ldraw_lib__4162p0f(), step=step, col=col, unit=unit, alt=alt, line=line, solid=solid);
ldraw_lib__4162p0f(line=0.2);
